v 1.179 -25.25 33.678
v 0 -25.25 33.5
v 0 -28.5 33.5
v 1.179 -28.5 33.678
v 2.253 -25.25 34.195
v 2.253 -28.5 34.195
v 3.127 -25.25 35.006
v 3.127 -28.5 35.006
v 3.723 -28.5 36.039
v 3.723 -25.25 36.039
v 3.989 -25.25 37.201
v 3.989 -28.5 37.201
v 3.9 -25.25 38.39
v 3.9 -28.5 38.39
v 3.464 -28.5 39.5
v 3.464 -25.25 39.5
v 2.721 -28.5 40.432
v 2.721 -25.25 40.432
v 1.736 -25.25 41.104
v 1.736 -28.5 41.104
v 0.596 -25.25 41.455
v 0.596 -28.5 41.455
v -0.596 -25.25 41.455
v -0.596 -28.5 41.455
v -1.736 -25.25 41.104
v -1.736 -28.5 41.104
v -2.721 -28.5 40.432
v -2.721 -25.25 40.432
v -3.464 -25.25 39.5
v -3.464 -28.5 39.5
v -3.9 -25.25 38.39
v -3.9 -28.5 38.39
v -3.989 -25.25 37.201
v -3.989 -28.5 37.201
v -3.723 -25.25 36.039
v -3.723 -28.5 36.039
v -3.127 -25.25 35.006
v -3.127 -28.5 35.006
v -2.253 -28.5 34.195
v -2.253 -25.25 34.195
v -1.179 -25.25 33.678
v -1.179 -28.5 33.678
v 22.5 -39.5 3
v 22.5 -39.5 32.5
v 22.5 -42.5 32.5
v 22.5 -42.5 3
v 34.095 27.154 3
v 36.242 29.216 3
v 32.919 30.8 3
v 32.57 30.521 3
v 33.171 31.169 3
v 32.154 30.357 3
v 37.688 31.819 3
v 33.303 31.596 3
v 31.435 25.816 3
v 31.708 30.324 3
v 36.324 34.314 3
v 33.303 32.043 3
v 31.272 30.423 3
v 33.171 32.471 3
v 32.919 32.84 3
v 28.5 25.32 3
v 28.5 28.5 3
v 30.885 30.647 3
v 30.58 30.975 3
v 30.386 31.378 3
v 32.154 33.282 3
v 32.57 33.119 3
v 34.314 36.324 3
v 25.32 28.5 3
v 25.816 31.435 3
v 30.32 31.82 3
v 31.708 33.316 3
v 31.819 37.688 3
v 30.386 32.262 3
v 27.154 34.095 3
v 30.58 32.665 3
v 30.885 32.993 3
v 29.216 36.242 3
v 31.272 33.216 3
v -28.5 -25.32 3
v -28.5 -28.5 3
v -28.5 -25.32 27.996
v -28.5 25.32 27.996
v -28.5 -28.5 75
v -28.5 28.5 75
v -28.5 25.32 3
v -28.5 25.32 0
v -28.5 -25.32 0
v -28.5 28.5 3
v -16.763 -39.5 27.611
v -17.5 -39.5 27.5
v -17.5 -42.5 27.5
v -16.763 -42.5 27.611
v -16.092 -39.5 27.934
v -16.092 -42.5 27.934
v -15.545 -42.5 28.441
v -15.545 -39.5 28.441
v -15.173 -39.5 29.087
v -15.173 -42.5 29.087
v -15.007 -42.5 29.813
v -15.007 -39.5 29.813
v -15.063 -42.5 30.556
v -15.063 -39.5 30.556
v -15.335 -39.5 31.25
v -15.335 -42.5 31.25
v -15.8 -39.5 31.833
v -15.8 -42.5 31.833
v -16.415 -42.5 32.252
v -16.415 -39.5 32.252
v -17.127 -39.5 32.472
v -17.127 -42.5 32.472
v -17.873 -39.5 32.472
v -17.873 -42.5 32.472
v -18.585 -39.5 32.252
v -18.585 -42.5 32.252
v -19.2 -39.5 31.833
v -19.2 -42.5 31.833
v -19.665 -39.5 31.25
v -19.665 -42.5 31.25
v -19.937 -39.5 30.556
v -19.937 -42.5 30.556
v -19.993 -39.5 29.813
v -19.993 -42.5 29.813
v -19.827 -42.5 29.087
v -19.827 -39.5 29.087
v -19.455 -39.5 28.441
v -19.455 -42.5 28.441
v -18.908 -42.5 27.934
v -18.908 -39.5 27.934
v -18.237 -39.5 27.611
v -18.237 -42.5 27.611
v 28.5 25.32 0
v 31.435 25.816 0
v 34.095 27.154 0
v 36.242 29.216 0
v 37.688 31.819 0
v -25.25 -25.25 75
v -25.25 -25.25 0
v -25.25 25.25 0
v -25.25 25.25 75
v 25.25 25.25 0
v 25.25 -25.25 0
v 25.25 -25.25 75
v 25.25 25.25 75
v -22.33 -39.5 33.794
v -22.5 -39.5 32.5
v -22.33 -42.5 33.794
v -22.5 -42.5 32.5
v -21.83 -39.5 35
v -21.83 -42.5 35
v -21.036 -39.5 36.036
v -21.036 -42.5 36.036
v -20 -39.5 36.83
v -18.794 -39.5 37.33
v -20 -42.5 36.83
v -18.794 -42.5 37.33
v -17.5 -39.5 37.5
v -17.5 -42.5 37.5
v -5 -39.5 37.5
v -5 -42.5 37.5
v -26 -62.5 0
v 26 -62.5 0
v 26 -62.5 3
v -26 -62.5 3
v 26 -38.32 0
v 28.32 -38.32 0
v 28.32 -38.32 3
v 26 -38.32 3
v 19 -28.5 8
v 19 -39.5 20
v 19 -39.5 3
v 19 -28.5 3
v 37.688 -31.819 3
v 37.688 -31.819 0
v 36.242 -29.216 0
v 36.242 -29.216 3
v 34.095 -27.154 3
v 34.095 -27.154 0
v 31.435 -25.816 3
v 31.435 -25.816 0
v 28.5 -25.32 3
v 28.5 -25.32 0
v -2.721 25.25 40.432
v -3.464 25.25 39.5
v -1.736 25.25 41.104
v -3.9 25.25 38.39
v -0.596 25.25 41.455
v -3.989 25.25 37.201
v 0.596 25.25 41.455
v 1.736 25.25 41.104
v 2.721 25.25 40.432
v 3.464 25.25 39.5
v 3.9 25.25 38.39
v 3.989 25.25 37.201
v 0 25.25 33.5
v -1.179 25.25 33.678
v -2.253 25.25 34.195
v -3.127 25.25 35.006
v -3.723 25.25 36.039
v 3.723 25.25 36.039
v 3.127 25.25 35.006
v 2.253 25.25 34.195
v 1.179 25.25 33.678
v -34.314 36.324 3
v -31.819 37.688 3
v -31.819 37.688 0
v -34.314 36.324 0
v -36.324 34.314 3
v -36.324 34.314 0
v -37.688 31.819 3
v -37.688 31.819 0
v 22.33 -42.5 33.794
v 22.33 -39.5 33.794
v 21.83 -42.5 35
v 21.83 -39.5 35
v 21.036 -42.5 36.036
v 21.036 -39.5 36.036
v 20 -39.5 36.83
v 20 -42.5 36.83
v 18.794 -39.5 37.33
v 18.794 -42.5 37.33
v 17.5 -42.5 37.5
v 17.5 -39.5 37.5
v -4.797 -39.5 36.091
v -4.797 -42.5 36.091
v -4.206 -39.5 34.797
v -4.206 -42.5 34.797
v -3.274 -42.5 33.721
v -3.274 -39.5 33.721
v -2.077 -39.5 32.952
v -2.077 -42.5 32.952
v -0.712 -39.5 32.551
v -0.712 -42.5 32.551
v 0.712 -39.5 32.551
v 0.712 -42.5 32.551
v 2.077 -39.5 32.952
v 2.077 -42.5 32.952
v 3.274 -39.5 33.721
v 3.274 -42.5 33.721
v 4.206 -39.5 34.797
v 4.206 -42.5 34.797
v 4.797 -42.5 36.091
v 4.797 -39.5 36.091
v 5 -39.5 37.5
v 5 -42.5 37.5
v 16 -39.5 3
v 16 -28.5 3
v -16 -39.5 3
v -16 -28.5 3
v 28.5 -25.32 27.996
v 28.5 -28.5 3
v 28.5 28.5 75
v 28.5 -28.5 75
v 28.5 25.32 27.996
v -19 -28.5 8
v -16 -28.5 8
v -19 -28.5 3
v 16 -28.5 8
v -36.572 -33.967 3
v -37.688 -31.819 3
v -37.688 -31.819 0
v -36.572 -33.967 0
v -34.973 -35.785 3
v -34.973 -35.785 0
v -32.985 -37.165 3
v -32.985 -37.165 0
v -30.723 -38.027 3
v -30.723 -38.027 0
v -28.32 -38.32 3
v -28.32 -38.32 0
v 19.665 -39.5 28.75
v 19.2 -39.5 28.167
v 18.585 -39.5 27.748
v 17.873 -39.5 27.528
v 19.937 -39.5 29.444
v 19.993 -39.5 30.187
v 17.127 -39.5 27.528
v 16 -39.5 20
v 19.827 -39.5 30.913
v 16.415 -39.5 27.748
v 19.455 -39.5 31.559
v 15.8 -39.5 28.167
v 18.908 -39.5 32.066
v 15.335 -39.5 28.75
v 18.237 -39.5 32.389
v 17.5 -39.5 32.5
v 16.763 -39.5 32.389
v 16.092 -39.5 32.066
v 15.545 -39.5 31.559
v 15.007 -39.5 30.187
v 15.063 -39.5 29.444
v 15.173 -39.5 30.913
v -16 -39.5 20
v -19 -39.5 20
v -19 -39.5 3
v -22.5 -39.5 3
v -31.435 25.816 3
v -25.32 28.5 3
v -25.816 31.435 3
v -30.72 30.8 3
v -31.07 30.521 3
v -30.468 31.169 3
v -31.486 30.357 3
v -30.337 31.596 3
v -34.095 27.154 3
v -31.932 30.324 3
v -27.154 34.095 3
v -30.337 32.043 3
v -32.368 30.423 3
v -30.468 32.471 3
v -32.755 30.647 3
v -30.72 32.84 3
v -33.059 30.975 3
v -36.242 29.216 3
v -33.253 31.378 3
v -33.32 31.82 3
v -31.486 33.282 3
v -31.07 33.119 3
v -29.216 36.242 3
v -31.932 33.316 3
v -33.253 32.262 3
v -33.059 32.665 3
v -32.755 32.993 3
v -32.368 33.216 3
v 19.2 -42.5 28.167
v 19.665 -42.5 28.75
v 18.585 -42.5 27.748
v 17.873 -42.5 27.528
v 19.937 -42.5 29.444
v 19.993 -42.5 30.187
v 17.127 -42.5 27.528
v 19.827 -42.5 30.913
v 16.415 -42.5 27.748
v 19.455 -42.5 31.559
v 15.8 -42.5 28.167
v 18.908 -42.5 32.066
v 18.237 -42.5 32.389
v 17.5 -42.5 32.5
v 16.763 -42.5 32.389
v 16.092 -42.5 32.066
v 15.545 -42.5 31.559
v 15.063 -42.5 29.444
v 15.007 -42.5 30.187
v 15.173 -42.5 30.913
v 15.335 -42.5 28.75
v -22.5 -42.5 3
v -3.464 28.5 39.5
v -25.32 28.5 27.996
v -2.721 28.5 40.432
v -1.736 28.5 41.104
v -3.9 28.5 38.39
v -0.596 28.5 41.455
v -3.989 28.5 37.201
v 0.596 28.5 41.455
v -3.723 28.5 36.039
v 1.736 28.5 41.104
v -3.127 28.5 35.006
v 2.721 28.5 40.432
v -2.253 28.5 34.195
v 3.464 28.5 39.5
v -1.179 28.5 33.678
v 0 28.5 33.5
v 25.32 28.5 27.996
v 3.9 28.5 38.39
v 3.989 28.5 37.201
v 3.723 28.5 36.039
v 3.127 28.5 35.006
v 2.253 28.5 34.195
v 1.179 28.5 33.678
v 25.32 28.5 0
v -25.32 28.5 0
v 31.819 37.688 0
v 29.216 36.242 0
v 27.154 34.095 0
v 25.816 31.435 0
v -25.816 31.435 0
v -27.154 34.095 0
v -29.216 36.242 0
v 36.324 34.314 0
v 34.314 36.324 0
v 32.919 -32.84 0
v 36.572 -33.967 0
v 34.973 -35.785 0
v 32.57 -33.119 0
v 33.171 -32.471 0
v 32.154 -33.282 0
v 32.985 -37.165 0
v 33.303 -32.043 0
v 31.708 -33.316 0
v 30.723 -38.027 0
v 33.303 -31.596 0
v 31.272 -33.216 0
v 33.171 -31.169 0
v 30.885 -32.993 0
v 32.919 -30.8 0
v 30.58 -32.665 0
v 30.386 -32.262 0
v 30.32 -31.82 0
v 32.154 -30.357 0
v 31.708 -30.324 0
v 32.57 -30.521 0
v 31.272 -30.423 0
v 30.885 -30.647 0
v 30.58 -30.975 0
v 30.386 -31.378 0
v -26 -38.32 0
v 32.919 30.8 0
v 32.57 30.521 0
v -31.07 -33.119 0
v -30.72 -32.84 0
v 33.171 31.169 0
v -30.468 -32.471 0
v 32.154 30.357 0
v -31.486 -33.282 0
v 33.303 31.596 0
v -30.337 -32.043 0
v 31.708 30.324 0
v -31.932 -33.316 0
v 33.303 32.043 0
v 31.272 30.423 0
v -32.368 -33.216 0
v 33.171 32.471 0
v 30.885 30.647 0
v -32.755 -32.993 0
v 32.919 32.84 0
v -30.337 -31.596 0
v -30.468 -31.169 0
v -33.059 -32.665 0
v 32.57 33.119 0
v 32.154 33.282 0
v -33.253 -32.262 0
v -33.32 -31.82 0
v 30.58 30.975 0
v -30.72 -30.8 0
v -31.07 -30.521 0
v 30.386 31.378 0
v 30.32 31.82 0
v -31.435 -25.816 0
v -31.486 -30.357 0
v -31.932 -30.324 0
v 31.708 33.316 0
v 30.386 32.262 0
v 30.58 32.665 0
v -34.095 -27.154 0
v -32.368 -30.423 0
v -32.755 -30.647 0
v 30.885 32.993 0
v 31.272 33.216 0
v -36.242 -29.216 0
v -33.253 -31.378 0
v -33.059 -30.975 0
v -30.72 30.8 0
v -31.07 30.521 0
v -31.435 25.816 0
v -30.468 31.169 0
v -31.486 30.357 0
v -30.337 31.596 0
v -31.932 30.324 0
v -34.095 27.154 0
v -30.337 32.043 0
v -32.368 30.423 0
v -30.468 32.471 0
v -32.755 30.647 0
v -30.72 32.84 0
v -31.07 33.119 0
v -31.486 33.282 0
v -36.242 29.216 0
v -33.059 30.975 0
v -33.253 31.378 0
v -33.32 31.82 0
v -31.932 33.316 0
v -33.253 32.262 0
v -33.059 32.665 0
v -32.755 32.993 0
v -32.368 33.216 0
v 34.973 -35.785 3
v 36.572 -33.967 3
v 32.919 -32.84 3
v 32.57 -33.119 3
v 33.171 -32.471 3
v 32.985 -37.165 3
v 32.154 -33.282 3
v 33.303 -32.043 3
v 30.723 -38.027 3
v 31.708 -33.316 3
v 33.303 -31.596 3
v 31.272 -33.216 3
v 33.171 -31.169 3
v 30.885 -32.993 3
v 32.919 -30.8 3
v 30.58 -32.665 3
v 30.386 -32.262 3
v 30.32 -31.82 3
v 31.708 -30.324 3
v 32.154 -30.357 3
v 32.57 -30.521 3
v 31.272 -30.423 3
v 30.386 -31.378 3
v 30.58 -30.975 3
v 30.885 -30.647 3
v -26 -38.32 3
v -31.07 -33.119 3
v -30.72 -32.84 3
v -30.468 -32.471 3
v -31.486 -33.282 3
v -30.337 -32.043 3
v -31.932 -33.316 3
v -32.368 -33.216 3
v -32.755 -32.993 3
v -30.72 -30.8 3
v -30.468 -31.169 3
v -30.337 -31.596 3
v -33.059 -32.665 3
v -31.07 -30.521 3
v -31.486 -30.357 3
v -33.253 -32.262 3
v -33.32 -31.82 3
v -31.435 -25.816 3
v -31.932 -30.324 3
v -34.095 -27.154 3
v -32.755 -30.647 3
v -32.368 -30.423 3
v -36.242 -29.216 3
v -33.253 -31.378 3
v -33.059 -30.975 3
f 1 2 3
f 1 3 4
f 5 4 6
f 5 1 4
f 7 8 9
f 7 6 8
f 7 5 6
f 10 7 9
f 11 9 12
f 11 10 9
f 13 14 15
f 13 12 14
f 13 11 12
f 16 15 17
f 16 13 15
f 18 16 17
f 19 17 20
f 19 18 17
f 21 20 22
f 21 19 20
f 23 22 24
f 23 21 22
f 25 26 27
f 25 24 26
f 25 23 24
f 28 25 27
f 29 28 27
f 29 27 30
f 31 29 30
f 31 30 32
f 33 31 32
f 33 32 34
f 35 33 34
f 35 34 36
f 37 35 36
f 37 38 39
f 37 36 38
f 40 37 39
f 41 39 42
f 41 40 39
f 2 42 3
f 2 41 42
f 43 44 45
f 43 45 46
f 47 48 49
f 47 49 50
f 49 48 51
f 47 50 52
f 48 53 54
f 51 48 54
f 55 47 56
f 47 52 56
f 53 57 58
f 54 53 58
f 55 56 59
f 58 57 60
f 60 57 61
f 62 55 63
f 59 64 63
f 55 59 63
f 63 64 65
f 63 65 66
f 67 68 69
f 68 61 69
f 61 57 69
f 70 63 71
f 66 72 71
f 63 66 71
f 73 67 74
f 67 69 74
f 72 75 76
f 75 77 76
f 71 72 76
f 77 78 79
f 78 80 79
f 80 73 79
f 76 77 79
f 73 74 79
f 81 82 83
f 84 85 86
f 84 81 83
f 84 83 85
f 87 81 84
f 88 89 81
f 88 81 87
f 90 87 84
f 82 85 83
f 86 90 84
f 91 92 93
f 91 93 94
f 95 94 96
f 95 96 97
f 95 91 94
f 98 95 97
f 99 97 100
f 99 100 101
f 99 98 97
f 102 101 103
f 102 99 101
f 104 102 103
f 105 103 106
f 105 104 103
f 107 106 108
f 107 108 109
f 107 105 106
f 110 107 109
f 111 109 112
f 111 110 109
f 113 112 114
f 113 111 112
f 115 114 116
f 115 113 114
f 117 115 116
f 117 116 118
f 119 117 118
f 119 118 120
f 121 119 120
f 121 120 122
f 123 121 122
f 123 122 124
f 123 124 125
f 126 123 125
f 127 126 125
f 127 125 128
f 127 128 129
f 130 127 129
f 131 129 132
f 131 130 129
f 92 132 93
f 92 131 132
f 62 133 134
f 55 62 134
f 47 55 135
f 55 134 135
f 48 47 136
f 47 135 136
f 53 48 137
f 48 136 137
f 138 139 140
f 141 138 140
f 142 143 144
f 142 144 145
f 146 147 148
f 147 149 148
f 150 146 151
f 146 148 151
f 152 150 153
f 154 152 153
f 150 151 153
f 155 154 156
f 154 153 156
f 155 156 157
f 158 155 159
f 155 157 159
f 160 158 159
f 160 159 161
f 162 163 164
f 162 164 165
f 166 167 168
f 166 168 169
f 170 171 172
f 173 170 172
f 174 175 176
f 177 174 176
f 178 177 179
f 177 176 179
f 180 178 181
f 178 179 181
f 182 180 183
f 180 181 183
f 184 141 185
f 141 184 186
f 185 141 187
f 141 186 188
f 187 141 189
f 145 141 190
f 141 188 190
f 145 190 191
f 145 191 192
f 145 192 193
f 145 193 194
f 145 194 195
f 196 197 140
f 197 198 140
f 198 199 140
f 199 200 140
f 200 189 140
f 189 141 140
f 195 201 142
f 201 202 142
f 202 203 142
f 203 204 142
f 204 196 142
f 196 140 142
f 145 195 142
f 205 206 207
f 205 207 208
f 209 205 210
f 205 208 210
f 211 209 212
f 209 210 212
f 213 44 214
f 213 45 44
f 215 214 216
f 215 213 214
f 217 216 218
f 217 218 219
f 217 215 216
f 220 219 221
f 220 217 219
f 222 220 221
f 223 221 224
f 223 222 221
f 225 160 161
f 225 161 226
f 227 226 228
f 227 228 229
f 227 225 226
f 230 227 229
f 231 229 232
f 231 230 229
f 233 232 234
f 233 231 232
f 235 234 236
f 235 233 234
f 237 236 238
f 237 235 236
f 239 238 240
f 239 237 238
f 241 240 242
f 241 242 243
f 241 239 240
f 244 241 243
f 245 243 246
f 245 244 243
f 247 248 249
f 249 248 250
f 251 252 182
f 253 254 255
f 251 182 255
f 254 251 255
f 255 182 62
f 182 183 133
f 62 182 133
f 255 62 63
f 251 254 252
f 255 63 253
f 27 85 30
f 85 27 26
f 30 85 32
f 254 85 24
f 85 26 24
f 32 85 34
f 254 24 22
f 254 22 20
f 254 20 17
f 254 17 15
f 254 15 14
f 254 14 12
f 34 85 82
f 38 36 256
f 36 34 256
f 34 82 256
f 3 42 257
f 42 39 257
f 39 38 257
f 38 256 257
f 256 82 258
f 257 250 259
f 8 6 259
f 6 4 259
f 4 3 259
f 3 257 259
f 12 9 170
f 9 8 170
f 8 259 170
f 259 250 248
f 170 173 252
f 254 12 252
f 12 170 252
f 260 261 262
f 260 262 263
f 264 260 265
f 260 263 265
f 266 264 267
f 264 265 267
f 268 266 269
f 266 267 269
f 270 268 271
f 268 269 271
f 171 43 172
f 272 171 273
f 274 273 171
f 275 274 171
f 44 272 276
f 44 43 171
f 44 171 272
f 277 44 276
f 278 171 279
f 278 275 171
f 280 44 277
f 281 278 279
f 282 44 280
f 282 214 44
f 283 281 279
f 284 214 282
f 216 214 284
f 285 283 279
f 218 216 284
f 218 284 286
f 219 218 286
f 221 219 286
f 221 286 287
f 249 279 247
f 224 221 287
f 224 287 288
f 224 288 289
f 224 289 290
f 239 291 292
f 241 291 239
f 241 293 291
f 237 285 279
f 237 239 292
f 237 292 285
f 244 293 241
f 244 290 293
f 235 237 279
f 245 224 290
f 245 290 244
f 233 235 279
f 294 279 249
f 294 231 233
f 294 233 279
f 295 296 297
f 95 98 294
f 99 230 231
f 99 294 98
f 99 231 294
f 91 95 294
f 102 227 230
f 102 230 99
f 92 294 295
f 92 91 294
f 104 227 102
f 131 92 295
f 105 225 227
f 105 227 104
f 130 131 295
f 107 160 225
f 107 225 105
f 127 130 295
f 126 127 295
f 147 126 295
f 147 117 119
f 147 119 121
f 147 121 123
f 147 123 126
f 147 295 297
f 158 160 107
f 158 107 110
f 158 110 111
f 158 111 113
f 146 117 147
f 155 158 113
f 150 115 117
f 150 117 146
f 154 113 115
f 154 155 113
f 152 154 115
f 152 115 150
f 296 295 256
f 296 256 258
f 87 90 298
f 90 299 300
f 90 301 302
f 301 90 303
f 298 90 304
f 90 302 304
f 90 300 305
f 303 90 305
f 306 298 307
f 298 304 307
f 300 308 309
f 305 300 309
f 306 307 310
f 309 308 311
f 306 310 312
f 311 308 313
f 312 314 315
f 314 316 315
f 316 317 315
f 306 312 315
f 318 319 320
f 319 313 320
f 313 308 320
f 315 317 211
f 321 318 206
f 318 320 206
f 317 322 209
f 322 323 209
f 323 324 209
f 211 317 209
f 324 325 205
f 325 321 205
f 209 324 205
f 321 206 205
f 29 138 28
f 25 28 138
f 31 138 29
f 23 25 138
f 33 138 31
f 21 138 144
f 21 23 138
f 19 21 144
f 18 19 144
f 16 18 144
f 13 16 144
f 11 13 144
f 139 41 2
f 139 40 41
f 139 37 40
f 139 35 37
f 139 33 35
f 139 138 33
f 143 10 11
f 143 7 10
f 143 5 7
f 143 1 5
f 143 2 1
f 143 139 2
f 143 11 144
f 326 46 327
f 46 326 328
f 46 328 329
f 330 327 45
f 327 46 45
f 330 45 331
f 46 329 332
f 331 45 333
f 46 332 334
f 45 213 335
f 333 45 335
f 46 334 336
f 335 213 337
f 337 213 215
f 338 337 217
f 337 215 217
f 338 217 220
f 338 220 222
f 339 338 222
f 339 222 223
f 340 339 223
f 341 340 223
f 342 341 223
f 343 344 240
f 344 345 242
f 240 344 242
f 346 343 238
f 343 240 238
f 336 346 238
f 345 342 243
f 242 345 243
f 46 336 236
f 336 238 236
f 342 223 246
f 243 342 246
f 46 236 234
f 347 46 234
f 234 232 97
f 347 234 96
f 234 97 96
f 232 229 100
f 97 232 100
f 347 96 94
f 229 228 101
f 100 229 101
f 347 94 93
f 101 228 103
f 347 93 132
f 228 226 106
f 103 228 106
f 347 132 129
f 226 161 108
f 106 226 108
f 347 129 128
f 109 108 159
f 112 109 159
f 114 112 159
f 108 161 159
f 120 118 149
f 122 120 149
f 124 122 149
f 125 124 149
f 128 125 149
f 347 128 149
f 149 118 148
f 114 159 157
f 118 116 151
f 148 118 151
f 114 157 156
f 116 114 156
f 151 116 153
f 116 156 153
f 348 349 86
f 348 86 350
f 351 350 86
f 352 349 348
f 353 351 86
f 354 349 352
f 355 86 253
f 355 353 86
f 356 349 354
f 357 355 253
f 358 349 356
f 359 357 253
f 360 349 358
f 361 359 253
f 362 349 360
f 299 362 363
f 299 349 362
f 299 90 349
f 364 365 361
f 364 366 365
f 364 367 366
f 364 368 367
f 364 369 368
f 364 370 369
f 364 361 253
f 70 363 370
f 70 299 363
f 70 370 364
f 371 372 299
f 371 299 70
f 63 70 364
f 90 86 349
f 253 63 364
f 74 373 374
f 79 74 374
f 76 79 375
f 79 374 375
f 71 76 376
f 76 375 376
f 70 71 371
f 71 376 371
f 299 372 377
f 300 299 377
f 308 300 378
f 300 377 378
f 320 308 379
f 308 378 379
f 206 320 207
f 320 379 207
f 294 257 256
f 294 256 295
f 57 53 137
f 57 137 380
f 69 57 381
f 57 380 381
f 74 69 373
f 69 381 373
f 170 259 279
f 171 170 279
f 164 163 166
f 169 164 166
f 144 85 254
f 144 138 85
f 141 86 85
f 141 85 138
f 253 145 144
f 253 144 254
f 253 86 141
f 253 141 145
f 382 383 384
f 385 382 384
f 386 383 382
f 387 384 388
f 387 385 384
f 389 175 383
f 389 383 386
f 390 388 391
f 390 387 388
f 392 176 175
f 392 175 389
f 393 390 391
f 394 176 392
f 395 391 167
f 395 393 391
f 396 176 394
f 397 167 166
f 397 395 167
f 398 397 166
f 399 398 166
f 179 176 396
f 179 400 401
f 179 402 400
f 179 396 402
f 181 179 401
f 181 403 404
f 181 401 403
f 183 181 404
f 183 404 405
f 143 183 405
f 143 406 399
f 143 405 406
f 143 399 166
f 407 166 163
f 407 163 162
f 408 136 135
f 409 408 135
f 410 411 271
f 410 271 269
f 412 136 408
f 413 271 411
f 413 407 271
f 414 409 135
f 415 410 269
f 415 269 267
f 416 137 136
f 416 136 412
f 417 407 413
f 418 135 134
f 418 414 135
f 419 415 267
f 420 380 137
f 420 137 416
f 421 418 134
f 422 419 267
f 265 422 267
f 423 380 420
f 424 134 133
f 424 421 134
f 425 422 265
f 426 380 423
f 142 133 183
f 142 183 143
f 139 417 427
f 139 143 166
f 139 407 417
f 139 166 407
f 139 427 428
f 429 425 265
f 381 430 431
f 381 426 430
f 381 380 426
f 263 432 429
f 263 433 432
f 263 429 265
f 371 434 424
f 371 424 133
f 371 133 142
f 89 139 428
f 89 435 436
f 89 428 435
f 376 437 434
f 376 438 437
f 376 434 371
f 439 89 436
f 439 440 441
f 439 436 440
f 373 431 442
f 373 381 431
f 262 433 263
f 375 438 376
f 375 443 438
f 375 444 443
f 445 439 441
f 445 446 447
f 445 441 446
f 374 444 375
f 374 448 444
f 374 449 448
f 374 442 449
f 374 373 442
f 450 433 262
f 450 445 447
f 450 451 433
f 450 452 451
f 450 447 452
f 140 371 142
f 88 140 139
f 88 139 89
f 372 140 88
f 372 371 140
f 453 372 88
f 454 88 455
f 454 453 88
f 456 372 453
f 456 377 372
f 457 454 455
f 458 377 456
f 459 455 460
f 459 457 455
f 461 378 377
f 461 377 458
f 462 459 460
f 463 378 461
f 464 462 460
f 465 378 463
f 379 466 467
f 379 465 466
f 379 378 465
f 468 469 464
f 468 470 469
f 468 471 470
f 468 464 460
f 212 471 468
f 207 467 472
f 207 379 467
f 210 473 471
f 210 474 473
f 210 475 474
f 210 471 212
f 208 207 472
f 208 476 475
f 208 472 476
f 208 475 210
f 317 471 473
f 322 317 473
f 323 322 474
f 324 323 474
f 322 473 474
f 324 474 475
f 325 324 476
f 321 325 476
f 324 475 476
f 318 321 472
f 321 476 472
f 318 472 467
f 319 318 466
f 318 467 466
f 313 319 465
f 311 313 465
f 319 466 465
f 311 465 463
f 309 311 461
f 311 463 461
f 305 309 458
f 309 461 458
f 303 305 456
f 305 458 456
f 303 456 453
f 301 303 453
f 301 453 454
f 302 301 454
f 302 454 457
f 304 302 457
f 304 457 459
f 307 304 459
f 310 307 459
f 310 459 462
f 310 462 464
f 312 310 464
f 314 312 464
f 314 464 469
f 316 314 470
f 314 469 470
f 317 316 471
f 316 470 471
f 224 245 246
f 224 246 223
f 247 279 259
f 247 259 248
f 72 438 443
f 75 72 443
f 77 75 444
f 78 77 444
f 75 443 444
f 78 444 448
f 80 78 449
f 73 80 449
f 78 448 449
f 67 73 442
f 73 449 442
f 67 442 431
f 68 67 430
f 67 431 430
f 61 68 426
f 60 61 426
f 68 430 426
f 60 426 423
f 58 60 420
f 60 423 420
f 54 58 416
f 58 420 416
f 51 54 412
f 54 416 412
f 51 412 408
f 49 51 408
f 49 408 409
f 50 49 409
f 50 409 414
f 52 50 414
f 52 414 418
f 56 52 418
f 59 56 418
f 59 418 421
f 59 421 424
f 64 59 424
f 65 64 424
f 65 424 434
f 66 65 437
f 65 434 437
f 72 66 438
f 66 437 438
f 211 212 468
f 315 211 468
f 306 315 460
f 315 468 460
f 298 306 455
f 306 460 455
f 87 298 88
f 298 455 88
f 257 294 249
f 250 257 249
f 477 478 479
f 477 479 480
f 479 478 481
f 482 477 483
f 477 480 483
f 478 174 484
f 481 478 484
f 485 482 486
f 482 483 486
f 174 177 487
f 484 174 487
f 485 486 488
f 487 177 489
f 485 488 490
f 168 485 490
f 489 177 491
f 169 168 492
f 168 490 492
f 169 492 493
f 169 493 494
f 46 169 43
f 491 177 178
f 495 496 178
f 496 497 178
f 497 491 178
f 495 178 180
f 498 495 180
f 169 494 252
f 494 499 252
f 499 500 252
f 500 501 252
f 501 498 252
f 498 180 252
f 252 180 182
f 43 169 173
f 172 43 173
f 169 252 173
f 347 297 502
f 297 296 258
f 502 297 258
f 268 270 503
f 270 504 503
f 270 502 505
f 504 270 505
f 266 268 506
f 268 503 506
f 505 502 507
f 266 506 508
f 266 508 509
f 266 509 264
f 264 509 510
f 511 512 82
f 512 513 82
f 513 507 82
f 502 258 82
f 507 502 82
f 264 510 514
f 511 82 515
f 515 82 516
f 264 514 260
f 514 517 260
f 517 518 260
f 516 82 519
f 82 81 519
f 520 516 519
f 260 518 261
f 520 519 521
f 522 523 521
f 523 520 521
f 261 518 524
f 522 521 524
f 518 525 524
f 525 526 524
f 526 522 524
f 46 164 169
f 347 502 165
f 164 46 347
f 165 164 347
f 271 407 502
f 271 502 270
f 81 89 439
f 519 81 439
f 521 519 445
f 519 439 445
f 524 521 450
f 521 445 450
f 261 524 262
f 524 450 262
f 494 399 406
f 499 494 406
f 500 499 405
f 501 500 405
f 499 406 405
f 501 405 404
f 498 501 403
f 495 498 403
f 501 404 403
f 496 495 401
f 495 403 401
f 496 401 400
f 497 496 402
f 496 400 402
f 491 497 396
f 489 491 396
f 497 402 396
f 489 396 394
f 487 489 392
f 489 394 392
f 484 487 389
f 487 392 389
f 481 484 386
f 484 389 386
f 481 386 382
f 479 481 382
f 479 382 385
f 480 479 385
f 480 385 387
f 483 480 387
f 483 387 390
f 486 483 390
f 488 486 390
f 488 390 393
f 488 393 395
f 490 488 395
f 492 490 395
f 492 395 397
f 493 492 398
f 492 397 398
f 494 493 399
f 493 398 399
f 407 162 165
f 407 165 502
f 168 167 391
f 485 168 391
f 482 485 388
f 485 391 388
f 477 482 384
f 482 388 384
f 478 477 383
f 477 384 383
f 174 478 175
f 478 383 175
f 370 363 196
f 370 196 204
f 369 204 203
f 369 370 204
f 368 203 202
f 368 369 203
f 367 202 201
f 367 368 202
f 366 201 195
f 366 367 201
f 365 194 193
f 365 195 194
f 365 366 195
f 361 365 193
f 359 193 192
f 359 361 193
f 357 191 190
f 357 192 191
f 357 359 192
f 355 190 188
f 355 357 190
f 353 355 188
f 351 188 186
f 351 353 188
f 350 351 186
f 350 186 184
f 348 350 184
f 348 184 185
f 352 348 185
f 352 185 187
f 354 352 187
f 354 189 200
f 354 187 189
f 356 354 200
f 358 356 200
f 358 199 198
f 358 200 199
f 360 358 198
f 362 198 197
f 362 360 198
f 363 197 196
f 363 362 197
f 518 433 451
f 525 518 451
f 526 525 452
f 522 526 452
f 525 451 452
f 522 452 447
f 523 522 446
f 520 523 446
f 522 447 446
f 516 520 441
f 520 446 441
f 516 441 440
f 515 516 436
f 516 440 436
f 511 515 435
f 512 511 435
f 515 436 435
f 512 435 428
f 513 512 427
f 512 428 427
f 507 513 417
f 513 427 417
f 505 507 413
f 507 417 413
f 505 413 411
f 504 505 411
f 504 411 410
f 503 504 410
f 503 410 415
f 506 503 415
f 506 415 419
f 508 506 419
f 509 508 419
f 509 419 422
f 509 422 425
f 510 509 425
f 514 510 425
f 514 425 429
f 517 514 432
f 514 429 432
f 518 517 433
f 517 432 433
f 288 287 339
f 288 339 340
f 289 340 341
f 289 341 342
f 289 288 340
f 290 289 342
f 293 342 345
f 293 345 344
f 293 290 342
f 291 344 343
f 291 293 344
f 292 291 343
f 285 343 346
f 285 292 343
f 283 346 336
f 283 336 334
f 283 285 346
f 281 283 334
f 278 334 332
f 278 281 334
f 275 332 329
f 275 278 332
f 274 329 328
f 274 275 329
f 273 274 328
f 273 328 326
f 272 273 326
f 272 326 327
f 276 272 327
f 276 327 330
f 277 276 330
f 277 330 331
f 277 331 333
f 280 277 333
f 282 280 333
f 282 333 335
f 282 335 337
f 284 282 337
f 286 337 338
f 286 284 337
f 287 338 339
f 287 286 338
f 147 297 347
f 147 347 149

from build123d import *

# Parameters (mm, degrees)
ESQUISSE1_W                  = 57
ESQUISSE1_H                  = 57
ESQUISSE1_W_2                = 50.5
ESQUISSE1_H_2                = 50.5
BOSS_EXTRU_1_DEPTH           = 75
ENL_V_MAT_EXTRU_1_DEPTH      = 99.418748214
ENL_V_MAT_EXTRU_1_DEPTH_BACK = 99.418748214
ESQUISSE2_R                  = 4
ESQUISSE3_W                  = 52
ESQUISSE3_H                  = 34
BOSS_EXTRU_2_DEPTH           = 3
BOSS_EXTRU_3_START           = -23
ESQUISSE4_R                  = 2.5
BOSS_EXTRU_3_DEPTH           = 3
CONG_1_R                     = 5
BOSS_EXTRU_4_START           = -6.5
BOSS_EXTRU_4_DEPTH           = 3
ESQUISSE9_W                  = 13
ESQUISSE9_H                  = 13
ESQUISSE9_R                  = 1.5
BOSS_EXTRU_5_DEPTH           = 3
CONG_2_R                     = 10


with BuildPart() as part:
    # Esquisse1 → Boss.-Extru.1 (new body)
    with BuildSketch(Plane.XY):
        Rectangle(ESQUISSE1_W, ESQUISSE1_H)
        Rectangle(ESQUISSE1_W_2, ESQUISSE1_H_2, mode=Mode.SUBTRACT)
    extrude(amount=BOSS_EXTRU_1_DEPTH)

    # Esquisse2 → Enlèv. mat.-Extru.1 (cut, two sides: drawn at the far end of the back side and taken through both)
    with BuildSketch(Plane.XZ.offset(28.5).offset(-ENL_V_MAT_EXTRU_1_DEPTH_BACK)):
        with Locations(Location((0, 37.5, 0), (0, 0, 270))):
            Circle(ESQUISSE2_R)
    extrude(amount=ENL_V_MAT_EXTRU_1_DEPTH + ENL_V_MAT_EXTRU_1_DEPTH_BACK, mode=Mode.SUBTRACT)

    # Esquisse3 → Boss.-Extru.2 (add)
    with BuildSketch(Plane(origin=(0, 0, 0), x_dir=(-1, 0, 0), z_dir=(0, 0, -1))):
        with Locations((0, -45.5)):
            Rectangle(ESQUISSE3_W, ESQUISSE3_H)
    extrude(amount=-BOSS_EXTRU_2_DEPTH)

    # Esquisse4 → Boss.-Extru.3 (add)
    with BuildSketch(Plane.XZ.offset(62.5).offset(BOSS_EXTRU_3_START)):
        with BuildLine():
            Line((-22.5, 3), (-22.5, 37.5))
            Line((-22.5, 37.5), (-5, 37.5))
            ThreePointArc((-5, 37.5), (0, 32.5), (5, 37.5))
            Line((5, 37.5), (22.5, 37.5))
            Line((22.5, 37.5), (22.5, 3))
            Line((22.5, 3), (-22.5, 3))
        make_face()
        with Locations(Location((-17.5, 30, 0), (0, 0, 270))):
            Circle(ESQUISSE4_R, mode=Mode.SUBTRACT)
        with Locations(Location((17.5, 30, 0), (0, 0, 90))):
            Circle(ESQUISSE4_R, mode=Mode.SUBTRACT)
    extrude(amount=BOSS_EXTRU_3_DEPTH)

    # Congé1
    cong_1_edges = [part.edges().sort_by_distance(p)[0] for p in [
        (-22.5, -41, 37.5),
        (22.5, -41, 37.5),
    ]]
    fillet(cong_1_edges, radius=CONG_1_R)

    # Esquisse8 → Boss.-Extru.4 (add)
    with BuildSketch(Plane.ZY.offset(22.5).offset(BOSS_EXTRU_4_START)):
        Polygon((3, -28.5), (8, -28.5), (20, -39.5), (3, -39.5), align=None)
    boss_extru_4 = extrude(amount=BOSS_EXTRU_4_DEPTH)

    # Symétrie1: Boss.-Extru.4 across plane
    add(boss_extru_4.mirror(Plane(origin=(0, 0, 0), x_dir=(0, 0, 1), z_dir=(1, 0, 0))))

    # Esquisse9 → Boss.-Extru.5 (add)
    # profile 1 of 4: a face of its own
    with BuildSketch(Plane(origin=(0, 0, 0), x_dir=(-1, 0, 0), z_dir=(0, 0, -1))):
        with Locations((-31.819805153, 31.819805153)):
            Rectangle(ESQUISSE9_W, ESQUISSE9_H)
        with Locations((-31.819805153, 31.819805153)):
            Circle(ESQUISSE9_R, mode=Mode.SUBTRACT)
    # profile 2 of 4: a face of its own
    with BuildSketch(Plane(origin=(0, 0, 0), x_dir=(-1, 0, 0), z_dir=(0, 0, -1))):
        with Locations((31.819805153, 31.819805153)):
            Rectangle(ESQUISSE9_W, ESQUISSE9_H)
        with Locations((31.819805153, 31.819805153)):
            Circle(ESQUISSE9_R, mode=Mode.SUBTRACT)
    # profile 3 of 4: a face of its own
    with BuildSketch(Plane(origin=(0, 0, 0), x_dir=(-1, 0, 0), z_dir=(0, 0, -1))):
        with Locations((31.819805153, -31.819805153)):
            Rectangle(ESQUISSE9_W, ESQUISSE9_H)
        with Locations((31.819805153, -31.819805153)):
            Circle(ESQUISSE9_R, mode=Mode.SUBTRACT)
    # profile 4 of 4: a face of its own
    with BuildSketch(Plane(origin=(0, 0, 0), x_dir=(-1, 0, 0), z_dir=(0, 0, -1))):
        with Locations((-31.819805153, -31.819805153)):
            Rectangle(ESQUISSE9_W, ESQUISSE9_H)
        with Locations((-31.819805153, -31.819805153)):
            Circle(ESQUISSE9_R, mode=Mode.SUBTRACT)
    extrude(amount=-BOSS_EXTRU_5_DEPTH)

    # Congé2
    # the kernel refuses this fillet: 10 mm, written as the material it takes off along each edge
    with BuildSketch(Plane(origin=(-38.319805153, -38.319805153, -25), x_dir=(0, 1, 0), z_dir=(0, 0, 1)), Plane(origin=(38.319805153, -38.319805153, -25), x_dir=(-1, 0, 0), z_dir=(0, 0, 1)), Plane(origin=(38.319805153, 38.319805153, -25), x_dir=(0, -1, 0), z_dir=(0, 0, 1)), Plane(origin=(-38.319805153, 38.319805153, -25), x_dir=(1, 0, 0), z_dir=(0, 0, 1))) as cong_2_piece_1:
        with BuildLine():
            CenterArc((CONG_2_R, -CONG_2_R), CONG_2_R, 90, 90)
            Line((0, -CONG_2_R), (-CONG_2_R * 0.02, -CONG_2_R))
            Line((-CONG_2_R * 0.02, -CONG_2_R), (-CONG_2_R * 0.02, CONG_2_R * 0.02))
            Line((-CONG_2_R * 0.02, CONG_2_R * 0.02), (CONG_2_R, CONG_2_R * 0.02))
            Line((CONG_2_R, CONG_2_R * 0.02), (CONG_2_R, 0))
        make_face()
    extrude(amount=53, mode=Mode.SUBTRACT)
    with BuildSketch(Plane(origin=(-38.319805153, -25.319805153, -24.995940898), x_dir=(1, 0, 0), z_dir=(0, 0, 1)), Plane(origin=(38.319805153, 25.319805153, -24.995940898), x_dir=(-1, 0, 0), z_dir=(0, 0, 1)), Plane(origin=(-25.319805153, 38.319805153, -24.995940898), x_dir=(0, -1, 0), z_dir=(0, 0, 1))) as cong_2_piece_2:
        with BuildLine():
            CenterArc((10, -9.998376359), CONG_2_R, 91.032496301, 88.967503699)
            Line((0, -9.998376359), (-0.2, -9.998376359))
            Line((-0.2, -9.998376359), (-0.2, 0))
            Line((-0.2, 0), (0, 0.2))
            ThreePointArc((0, 0.2), (4.909902577, 0.2), (9.816201256, 0.199967527))
            Line((9.816201256, 0.199967527), (9.819805153, 0))
        make_face()
    extrude(amount=52.991881795, mode=Mode.SUBTRACT)
    with BuildSketch(Plane(origin=(38.319805153, -25.319805153, -24.995940898), x_dir=(0, -1, 0), z_dir=(0, 0, 1)), Plane(origin=(25.319805153, 38.319805153, -24.995940898), x_dir=(1, 0, 0), z_dir=(0, 0, 1)), Plane(origin=(-38.319805153, 25.319805153, -24.995940898), x_dir=(0, 1, 0), z_dir=(0, 0, 1))) as cong_2_piece_3:
        with BuildLine():
            CenterArc((9.998376359, -10), CONG_2_R, 90, 88.967503699)
            Line((0, -9.819805153), (-0.199967527, -9.816201256))
            ThreePointArc((-0.199967527, -9.816201256), (-0.2, -4.909902577), (-0.2, 0))
            Line((-0.2, 0), (0, 0.2))
            Line((0, 0.2), (9.998376359, 0.2))
            Line((9.998376359, 0.2), (9.998376359, 0))
        make_face()
    extrude(amount=52.991881795, mode=Mode.SUBTRACT)


solid = part.part
